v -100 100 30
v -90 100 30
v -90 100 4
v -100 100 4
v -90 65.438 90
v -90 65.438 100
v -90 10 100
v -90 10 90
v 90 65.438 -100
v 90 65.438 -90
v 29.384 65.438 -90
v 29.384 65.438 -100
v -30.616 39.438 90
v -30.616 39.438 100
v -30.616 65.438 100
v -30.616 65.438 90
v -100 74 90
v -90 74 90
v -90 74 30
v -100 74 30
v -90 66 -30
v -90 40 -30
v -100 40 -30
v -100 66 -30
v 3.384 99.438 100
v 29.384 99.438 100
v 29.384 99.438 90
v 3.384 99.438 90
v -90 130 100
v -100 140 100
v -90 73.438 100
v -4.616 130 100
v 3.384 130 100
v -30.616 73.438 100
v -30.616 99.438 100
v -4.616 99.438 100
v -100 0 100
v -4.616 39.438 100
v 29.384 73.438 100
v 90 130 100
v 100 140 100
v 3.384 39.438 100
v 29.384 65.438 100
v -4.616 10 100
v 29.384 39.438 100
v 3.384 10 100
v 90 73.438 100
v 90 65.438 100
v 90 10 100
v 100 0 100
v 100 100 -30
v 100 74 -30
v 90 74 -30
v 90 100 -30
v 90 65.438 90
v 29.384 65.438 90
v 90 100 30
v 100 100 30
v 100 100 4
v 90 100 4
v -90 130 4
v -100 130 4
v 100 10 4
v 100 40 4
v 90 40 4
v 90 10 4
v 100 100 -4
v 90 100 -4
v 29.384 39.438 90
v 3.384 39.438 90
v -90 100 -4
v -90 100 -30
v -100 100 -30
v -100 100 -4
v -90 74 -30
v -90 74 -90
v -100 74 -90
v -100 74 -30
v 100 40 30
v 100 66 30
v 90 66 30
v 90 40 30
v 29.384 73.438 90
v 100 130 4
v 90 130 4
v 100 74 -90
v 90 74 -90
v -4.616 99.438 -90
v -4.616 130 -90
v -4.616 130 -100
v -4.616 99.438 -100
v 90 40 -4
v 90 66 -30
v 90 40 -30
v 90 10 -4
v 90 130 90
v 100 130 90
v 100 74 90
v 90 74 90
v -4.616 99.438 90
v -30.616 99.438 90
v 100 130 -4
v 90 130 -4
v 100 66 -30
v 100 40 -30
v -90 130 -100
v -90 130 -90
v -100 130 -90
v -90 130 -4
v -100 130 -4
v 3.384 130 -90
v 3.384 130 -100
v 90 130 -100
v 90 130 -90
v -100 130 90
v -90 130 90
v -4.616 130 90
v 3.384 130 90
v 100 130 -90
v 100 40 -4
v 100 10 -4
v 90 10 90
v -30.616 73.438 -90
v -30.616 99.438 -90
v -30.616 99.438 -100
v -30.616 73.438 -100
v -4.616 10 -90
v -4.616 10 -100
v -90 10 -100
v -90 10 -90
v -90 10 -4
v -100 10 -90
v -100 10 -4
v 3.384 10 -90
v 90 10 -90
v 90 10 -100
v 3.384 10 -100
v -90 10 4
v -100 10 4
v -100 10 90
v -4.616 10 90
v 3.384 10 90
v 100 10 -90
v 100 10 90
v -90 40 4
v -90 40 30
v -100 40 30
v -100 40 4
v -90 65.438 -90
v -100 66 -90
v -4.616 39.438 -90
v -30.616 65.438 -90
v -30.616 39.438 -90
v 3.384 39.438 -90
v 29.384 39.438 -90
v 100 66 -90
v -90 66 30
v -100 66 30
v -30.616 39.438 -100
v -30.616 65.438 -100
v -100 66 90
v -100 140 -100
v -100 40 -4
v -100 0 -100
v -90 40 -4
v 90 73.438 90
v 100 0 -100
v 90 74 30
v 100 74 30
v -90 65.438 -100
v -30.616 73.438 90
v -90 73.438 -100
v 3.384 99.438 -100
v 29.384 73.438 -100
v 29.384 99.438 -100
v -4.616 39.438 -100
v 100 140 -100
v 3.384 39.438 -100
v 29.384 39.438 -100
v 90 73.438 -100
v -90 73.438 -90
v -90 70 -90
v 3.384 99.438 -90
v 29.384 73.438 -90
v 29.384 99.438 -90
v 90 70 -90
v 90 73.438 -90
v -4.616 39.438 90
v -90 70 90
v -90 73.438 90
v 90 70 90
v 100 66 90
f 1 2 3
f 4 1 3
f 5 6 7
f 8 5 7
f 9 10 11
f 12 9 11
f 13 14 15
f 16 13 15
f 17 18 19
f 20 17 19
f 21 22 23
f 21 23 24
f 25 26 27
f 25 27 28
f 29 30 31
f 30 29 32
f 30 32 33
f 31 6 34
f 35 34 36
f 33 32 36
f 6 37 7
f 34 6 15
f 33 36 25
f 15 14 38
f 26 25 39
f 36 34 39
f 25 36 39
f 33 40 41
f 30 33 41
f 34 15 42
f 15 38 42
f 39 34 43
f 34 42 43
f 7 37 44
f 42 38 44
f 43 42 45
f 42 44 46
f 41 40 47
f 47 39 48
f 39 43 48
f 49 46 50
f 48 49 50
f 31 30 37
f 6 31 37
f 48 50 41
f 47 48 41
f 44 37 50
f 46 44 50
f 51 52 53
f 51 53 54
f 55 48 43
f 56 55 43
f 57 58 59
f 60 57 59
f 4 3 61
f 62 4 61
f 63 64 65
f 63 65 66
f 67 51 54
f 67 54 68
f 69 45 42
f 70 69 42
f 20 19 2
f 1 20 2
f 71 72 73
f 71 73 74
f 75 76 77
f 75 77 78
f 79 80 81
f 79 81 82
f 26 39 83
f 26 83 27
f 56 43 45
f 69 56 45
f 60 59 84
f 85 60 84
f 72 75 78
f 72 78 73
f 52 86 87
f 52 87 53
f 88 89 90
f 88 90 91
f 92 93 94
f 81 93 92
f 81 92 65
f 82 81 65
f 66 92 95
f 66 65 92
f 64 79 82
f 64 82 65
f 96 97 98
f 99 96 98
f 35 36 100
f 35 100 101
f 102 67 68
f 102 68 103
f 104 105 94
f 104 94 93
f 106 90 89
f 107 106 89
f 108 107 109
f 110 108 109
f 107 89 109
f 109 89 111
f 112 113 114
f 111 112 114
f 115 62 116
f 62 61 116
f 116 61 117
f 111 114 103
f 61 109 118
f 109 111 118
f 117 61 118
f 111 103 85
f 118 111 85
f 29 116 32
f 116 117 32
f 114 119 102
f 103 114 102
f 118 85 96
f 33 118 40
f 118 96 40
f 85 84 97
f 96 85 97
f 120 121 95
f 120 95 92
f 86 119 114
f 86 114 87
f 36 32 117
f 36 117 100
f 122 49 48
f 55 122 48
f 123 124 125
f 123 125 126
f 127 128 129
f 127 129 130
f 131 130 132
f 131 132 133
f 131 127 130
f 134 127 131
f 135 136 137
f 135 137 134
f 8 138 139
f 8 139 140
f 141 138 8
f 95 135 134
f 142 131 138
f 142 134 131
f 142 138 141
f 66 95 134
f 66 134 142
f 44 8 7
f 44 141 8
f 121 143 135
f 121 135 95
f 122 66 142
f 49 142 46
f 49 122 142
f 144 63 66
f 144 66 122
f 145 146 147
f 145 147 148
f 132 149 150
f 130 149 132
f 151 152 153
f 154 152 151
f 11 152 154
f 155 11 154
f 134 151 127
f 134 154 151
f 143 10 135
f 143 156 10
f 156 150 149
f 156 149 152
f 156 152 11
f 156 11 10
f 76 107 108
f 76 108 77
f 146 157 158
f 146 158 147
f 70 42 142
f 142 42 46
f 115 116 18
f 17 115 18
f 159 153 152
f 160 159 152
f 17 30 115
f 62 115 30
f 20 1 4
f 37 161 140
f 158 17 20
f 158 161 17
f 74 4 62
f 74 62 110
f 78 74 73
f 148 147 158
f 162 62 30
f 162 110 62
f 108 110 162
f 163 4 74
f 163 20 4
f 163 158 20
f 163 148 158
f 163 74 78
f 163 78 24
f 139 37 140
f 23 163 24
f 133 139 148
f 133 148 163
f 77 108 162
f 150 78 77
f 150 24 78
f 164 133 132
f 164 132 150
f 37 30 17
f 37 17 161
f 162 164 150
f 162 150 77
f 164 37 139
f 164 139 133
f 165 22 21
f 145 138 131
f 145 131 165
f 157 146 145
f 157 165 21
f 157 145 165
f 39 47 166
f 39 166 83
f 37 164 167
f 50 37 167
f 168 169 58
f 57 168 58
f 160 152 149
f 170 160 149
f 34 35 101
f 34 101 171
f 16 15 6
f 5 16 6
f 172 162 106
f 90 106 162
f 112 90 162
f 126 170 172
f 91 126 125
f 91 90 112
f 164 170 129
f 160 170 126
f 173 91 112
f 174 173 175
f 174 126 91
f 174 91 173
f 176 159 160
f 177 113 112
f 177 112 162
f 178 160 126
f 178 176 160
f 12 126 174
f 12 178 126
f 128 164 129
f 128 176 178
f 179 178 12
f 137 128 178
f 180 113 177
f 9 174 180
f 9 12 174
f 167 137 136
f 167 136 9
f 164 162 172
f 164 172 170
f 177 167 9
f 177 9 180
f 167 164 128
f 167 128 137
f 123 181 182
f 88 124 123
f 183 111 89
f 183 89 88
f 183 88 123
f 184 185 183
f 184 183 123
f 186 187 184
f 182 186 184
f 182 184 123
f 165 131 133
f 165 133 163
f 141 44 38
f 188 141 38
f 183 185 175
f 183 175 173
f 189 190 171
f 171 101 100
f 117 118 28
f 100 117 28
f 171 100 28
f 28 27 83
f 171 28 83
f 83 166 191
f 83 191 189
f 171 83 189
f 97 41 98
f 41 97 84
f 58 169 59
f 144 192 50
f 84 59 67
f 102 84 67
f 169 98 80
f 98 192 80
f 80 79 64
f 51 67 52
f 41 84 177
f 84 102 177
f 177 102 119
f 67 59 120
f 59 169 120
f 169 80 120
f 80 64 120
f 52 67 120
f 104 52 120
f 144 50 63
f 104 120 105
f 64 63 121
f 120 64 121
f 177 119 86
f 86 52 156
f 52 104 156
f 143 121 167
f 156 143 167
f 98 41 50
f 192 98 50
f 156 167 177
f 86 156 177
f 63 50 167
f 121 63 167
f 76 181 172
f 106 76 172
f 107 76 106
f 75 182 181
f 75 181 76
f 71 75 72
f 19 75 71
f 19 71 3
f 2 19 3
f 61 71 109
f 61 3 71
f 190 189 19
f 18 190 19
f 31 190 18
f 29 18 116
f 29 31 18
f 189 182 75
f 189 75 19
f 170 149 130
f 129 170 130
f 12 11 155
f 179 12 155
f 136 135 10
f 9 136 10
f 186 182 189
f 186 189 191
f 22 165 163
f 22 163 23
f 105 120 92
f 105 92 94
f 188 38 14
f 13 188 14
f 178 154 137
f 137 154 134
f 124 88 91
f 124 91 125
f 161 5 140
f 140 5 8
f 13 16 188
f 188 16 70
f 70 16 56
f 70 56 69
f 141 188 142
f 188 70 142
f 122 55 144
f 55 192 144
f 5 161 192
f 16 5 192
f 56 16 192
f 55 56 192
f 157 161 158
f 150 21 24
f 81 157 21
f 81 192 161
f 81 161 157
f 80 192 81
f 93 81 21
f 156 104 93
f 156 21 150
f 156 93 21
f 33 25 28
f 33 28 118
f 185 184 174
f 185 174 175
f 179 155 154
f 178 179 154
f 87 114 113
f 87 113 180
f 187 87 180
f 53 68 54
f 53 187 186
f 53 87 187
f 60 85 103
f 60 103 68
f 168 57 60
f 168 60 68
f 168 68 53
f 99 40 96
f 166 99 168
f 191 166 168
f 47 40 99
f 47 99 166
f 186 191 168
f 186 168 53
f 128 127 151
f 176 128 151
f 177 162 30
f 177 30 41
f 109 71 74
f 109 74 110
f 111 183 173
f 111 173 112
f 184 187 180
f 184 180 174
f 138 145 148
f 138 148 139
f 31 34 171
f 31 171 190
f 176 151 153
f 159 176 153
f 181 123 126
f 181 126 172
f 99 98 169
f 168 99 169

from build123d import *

# Parameters (mm, degrees)
SKETCH1_W           = 200
SKETCH1_H           = 200
BOSS_EXTRUDE1_DEPTH = 140
SHELL2_T            = 10
CUT_EXTRUDE2_DEPTH  = 264.818119165
CUT_EXTRUDE3_DEPTH  = 264.818119165
SKETCH4_W           = 180
SKETCH4_H           = 180
BOSS_EXTRUDE3_DEPTH = 4


with BuildPart() as part:
    # Sketch1 → Boss-Extrude1 (new body)
    with BuildSketch(Plane(origin=(0, 0, 0), x_dir=(1, 0, 0), z_dir=(0, 1, 0))):
        Rectangle(SKETCH1_W, SKETCH1_H)
    extrude(amount=BOSS_EXTRUDE1_DEPTH)

    # Shell2 (no face opened: a closed hollow body)
    add(offset(amount=-SHELL2_T, mode=Mode.PRIVATE), mode=Mode.SUBTRACT)

    # Sketch2 → Cut-Extrude2 (cut, through all)
    with BuildSketch(Plane(origin=(100, 0, 0), x_dir=(0, 0, -1), z_dir=(1, 0, 0))):
        Polygon((-30, 40), (-4, 40), (-4, 10), (-90, 10), (-90, 66), (-30, 66), align=None)
        Polygon((-30, 100), (-4, 100), (-4, 130), (-90, 130), (-90, 74), (-30, 74), align=None)
        Polygon((30, 40), (30, 66), (90, 66), (90, 10), (4, 10), (4, 40), align=None)
        Polygon((30, 74), (30, 100), (4, 100), (4, 130), (90, 130), (90, 74), align=None)
    extrude(amount=-CUT_EXTRUDE2_DEPTH, mode=Mode.SUBTRACT)

    # Sketch3 → Cut-Extrude3 (cut, through all)
    with BuildSketch(Plane.XY.offset(100)):
        Polygon((3.383720977, 39.438488697), (3.383720977, 10), (90, 10), (90, 65.438488697), (29.383720977, 65.438488697), (29.383720977, 39.438488697), align=None)
        Polygon((3.383720977, 130), (90, 130), (90, 73.438488697), (29.383720977, 73.438488697), (29.383720977, 99.438488697), (3.383720977, 99.438488697), align=None)
        Polygon((-90, 130), (-4.616279023, 130), (-4.616279023, 99.438488697), (-30.616279023, 99.438488697), (-30.616279023, 73.438488697), (-90, 73.438488697), align=None)
        Polygon((-30.616279023, 65.438488697), (-90, 65.438488697), (-90, 10), (-4.616279023, 10), (-4.616279023, 39.438488697), (-30.616279023, 39.438488697), align=None)
    extrude(amount=-CUT_EXTRUDE3_DEPTH, mode=Mode.SUBTRACT)

    # Sketch4 → Boss-Extrude3 (add)
    with BuildSketch(Plane(origin=(29.307172117, 70, -14.72040922), x_dir=(1, 0, 0), z_dir=(0, 1, 0))):
        with Locations((-29.307172117, -14.72040922)):
            Rectangle(SKETCH4_W, SKETCH4_H)
    extrude(amount=-BOSS_EXTRUDE3_DEPTH)


solid = part.part
